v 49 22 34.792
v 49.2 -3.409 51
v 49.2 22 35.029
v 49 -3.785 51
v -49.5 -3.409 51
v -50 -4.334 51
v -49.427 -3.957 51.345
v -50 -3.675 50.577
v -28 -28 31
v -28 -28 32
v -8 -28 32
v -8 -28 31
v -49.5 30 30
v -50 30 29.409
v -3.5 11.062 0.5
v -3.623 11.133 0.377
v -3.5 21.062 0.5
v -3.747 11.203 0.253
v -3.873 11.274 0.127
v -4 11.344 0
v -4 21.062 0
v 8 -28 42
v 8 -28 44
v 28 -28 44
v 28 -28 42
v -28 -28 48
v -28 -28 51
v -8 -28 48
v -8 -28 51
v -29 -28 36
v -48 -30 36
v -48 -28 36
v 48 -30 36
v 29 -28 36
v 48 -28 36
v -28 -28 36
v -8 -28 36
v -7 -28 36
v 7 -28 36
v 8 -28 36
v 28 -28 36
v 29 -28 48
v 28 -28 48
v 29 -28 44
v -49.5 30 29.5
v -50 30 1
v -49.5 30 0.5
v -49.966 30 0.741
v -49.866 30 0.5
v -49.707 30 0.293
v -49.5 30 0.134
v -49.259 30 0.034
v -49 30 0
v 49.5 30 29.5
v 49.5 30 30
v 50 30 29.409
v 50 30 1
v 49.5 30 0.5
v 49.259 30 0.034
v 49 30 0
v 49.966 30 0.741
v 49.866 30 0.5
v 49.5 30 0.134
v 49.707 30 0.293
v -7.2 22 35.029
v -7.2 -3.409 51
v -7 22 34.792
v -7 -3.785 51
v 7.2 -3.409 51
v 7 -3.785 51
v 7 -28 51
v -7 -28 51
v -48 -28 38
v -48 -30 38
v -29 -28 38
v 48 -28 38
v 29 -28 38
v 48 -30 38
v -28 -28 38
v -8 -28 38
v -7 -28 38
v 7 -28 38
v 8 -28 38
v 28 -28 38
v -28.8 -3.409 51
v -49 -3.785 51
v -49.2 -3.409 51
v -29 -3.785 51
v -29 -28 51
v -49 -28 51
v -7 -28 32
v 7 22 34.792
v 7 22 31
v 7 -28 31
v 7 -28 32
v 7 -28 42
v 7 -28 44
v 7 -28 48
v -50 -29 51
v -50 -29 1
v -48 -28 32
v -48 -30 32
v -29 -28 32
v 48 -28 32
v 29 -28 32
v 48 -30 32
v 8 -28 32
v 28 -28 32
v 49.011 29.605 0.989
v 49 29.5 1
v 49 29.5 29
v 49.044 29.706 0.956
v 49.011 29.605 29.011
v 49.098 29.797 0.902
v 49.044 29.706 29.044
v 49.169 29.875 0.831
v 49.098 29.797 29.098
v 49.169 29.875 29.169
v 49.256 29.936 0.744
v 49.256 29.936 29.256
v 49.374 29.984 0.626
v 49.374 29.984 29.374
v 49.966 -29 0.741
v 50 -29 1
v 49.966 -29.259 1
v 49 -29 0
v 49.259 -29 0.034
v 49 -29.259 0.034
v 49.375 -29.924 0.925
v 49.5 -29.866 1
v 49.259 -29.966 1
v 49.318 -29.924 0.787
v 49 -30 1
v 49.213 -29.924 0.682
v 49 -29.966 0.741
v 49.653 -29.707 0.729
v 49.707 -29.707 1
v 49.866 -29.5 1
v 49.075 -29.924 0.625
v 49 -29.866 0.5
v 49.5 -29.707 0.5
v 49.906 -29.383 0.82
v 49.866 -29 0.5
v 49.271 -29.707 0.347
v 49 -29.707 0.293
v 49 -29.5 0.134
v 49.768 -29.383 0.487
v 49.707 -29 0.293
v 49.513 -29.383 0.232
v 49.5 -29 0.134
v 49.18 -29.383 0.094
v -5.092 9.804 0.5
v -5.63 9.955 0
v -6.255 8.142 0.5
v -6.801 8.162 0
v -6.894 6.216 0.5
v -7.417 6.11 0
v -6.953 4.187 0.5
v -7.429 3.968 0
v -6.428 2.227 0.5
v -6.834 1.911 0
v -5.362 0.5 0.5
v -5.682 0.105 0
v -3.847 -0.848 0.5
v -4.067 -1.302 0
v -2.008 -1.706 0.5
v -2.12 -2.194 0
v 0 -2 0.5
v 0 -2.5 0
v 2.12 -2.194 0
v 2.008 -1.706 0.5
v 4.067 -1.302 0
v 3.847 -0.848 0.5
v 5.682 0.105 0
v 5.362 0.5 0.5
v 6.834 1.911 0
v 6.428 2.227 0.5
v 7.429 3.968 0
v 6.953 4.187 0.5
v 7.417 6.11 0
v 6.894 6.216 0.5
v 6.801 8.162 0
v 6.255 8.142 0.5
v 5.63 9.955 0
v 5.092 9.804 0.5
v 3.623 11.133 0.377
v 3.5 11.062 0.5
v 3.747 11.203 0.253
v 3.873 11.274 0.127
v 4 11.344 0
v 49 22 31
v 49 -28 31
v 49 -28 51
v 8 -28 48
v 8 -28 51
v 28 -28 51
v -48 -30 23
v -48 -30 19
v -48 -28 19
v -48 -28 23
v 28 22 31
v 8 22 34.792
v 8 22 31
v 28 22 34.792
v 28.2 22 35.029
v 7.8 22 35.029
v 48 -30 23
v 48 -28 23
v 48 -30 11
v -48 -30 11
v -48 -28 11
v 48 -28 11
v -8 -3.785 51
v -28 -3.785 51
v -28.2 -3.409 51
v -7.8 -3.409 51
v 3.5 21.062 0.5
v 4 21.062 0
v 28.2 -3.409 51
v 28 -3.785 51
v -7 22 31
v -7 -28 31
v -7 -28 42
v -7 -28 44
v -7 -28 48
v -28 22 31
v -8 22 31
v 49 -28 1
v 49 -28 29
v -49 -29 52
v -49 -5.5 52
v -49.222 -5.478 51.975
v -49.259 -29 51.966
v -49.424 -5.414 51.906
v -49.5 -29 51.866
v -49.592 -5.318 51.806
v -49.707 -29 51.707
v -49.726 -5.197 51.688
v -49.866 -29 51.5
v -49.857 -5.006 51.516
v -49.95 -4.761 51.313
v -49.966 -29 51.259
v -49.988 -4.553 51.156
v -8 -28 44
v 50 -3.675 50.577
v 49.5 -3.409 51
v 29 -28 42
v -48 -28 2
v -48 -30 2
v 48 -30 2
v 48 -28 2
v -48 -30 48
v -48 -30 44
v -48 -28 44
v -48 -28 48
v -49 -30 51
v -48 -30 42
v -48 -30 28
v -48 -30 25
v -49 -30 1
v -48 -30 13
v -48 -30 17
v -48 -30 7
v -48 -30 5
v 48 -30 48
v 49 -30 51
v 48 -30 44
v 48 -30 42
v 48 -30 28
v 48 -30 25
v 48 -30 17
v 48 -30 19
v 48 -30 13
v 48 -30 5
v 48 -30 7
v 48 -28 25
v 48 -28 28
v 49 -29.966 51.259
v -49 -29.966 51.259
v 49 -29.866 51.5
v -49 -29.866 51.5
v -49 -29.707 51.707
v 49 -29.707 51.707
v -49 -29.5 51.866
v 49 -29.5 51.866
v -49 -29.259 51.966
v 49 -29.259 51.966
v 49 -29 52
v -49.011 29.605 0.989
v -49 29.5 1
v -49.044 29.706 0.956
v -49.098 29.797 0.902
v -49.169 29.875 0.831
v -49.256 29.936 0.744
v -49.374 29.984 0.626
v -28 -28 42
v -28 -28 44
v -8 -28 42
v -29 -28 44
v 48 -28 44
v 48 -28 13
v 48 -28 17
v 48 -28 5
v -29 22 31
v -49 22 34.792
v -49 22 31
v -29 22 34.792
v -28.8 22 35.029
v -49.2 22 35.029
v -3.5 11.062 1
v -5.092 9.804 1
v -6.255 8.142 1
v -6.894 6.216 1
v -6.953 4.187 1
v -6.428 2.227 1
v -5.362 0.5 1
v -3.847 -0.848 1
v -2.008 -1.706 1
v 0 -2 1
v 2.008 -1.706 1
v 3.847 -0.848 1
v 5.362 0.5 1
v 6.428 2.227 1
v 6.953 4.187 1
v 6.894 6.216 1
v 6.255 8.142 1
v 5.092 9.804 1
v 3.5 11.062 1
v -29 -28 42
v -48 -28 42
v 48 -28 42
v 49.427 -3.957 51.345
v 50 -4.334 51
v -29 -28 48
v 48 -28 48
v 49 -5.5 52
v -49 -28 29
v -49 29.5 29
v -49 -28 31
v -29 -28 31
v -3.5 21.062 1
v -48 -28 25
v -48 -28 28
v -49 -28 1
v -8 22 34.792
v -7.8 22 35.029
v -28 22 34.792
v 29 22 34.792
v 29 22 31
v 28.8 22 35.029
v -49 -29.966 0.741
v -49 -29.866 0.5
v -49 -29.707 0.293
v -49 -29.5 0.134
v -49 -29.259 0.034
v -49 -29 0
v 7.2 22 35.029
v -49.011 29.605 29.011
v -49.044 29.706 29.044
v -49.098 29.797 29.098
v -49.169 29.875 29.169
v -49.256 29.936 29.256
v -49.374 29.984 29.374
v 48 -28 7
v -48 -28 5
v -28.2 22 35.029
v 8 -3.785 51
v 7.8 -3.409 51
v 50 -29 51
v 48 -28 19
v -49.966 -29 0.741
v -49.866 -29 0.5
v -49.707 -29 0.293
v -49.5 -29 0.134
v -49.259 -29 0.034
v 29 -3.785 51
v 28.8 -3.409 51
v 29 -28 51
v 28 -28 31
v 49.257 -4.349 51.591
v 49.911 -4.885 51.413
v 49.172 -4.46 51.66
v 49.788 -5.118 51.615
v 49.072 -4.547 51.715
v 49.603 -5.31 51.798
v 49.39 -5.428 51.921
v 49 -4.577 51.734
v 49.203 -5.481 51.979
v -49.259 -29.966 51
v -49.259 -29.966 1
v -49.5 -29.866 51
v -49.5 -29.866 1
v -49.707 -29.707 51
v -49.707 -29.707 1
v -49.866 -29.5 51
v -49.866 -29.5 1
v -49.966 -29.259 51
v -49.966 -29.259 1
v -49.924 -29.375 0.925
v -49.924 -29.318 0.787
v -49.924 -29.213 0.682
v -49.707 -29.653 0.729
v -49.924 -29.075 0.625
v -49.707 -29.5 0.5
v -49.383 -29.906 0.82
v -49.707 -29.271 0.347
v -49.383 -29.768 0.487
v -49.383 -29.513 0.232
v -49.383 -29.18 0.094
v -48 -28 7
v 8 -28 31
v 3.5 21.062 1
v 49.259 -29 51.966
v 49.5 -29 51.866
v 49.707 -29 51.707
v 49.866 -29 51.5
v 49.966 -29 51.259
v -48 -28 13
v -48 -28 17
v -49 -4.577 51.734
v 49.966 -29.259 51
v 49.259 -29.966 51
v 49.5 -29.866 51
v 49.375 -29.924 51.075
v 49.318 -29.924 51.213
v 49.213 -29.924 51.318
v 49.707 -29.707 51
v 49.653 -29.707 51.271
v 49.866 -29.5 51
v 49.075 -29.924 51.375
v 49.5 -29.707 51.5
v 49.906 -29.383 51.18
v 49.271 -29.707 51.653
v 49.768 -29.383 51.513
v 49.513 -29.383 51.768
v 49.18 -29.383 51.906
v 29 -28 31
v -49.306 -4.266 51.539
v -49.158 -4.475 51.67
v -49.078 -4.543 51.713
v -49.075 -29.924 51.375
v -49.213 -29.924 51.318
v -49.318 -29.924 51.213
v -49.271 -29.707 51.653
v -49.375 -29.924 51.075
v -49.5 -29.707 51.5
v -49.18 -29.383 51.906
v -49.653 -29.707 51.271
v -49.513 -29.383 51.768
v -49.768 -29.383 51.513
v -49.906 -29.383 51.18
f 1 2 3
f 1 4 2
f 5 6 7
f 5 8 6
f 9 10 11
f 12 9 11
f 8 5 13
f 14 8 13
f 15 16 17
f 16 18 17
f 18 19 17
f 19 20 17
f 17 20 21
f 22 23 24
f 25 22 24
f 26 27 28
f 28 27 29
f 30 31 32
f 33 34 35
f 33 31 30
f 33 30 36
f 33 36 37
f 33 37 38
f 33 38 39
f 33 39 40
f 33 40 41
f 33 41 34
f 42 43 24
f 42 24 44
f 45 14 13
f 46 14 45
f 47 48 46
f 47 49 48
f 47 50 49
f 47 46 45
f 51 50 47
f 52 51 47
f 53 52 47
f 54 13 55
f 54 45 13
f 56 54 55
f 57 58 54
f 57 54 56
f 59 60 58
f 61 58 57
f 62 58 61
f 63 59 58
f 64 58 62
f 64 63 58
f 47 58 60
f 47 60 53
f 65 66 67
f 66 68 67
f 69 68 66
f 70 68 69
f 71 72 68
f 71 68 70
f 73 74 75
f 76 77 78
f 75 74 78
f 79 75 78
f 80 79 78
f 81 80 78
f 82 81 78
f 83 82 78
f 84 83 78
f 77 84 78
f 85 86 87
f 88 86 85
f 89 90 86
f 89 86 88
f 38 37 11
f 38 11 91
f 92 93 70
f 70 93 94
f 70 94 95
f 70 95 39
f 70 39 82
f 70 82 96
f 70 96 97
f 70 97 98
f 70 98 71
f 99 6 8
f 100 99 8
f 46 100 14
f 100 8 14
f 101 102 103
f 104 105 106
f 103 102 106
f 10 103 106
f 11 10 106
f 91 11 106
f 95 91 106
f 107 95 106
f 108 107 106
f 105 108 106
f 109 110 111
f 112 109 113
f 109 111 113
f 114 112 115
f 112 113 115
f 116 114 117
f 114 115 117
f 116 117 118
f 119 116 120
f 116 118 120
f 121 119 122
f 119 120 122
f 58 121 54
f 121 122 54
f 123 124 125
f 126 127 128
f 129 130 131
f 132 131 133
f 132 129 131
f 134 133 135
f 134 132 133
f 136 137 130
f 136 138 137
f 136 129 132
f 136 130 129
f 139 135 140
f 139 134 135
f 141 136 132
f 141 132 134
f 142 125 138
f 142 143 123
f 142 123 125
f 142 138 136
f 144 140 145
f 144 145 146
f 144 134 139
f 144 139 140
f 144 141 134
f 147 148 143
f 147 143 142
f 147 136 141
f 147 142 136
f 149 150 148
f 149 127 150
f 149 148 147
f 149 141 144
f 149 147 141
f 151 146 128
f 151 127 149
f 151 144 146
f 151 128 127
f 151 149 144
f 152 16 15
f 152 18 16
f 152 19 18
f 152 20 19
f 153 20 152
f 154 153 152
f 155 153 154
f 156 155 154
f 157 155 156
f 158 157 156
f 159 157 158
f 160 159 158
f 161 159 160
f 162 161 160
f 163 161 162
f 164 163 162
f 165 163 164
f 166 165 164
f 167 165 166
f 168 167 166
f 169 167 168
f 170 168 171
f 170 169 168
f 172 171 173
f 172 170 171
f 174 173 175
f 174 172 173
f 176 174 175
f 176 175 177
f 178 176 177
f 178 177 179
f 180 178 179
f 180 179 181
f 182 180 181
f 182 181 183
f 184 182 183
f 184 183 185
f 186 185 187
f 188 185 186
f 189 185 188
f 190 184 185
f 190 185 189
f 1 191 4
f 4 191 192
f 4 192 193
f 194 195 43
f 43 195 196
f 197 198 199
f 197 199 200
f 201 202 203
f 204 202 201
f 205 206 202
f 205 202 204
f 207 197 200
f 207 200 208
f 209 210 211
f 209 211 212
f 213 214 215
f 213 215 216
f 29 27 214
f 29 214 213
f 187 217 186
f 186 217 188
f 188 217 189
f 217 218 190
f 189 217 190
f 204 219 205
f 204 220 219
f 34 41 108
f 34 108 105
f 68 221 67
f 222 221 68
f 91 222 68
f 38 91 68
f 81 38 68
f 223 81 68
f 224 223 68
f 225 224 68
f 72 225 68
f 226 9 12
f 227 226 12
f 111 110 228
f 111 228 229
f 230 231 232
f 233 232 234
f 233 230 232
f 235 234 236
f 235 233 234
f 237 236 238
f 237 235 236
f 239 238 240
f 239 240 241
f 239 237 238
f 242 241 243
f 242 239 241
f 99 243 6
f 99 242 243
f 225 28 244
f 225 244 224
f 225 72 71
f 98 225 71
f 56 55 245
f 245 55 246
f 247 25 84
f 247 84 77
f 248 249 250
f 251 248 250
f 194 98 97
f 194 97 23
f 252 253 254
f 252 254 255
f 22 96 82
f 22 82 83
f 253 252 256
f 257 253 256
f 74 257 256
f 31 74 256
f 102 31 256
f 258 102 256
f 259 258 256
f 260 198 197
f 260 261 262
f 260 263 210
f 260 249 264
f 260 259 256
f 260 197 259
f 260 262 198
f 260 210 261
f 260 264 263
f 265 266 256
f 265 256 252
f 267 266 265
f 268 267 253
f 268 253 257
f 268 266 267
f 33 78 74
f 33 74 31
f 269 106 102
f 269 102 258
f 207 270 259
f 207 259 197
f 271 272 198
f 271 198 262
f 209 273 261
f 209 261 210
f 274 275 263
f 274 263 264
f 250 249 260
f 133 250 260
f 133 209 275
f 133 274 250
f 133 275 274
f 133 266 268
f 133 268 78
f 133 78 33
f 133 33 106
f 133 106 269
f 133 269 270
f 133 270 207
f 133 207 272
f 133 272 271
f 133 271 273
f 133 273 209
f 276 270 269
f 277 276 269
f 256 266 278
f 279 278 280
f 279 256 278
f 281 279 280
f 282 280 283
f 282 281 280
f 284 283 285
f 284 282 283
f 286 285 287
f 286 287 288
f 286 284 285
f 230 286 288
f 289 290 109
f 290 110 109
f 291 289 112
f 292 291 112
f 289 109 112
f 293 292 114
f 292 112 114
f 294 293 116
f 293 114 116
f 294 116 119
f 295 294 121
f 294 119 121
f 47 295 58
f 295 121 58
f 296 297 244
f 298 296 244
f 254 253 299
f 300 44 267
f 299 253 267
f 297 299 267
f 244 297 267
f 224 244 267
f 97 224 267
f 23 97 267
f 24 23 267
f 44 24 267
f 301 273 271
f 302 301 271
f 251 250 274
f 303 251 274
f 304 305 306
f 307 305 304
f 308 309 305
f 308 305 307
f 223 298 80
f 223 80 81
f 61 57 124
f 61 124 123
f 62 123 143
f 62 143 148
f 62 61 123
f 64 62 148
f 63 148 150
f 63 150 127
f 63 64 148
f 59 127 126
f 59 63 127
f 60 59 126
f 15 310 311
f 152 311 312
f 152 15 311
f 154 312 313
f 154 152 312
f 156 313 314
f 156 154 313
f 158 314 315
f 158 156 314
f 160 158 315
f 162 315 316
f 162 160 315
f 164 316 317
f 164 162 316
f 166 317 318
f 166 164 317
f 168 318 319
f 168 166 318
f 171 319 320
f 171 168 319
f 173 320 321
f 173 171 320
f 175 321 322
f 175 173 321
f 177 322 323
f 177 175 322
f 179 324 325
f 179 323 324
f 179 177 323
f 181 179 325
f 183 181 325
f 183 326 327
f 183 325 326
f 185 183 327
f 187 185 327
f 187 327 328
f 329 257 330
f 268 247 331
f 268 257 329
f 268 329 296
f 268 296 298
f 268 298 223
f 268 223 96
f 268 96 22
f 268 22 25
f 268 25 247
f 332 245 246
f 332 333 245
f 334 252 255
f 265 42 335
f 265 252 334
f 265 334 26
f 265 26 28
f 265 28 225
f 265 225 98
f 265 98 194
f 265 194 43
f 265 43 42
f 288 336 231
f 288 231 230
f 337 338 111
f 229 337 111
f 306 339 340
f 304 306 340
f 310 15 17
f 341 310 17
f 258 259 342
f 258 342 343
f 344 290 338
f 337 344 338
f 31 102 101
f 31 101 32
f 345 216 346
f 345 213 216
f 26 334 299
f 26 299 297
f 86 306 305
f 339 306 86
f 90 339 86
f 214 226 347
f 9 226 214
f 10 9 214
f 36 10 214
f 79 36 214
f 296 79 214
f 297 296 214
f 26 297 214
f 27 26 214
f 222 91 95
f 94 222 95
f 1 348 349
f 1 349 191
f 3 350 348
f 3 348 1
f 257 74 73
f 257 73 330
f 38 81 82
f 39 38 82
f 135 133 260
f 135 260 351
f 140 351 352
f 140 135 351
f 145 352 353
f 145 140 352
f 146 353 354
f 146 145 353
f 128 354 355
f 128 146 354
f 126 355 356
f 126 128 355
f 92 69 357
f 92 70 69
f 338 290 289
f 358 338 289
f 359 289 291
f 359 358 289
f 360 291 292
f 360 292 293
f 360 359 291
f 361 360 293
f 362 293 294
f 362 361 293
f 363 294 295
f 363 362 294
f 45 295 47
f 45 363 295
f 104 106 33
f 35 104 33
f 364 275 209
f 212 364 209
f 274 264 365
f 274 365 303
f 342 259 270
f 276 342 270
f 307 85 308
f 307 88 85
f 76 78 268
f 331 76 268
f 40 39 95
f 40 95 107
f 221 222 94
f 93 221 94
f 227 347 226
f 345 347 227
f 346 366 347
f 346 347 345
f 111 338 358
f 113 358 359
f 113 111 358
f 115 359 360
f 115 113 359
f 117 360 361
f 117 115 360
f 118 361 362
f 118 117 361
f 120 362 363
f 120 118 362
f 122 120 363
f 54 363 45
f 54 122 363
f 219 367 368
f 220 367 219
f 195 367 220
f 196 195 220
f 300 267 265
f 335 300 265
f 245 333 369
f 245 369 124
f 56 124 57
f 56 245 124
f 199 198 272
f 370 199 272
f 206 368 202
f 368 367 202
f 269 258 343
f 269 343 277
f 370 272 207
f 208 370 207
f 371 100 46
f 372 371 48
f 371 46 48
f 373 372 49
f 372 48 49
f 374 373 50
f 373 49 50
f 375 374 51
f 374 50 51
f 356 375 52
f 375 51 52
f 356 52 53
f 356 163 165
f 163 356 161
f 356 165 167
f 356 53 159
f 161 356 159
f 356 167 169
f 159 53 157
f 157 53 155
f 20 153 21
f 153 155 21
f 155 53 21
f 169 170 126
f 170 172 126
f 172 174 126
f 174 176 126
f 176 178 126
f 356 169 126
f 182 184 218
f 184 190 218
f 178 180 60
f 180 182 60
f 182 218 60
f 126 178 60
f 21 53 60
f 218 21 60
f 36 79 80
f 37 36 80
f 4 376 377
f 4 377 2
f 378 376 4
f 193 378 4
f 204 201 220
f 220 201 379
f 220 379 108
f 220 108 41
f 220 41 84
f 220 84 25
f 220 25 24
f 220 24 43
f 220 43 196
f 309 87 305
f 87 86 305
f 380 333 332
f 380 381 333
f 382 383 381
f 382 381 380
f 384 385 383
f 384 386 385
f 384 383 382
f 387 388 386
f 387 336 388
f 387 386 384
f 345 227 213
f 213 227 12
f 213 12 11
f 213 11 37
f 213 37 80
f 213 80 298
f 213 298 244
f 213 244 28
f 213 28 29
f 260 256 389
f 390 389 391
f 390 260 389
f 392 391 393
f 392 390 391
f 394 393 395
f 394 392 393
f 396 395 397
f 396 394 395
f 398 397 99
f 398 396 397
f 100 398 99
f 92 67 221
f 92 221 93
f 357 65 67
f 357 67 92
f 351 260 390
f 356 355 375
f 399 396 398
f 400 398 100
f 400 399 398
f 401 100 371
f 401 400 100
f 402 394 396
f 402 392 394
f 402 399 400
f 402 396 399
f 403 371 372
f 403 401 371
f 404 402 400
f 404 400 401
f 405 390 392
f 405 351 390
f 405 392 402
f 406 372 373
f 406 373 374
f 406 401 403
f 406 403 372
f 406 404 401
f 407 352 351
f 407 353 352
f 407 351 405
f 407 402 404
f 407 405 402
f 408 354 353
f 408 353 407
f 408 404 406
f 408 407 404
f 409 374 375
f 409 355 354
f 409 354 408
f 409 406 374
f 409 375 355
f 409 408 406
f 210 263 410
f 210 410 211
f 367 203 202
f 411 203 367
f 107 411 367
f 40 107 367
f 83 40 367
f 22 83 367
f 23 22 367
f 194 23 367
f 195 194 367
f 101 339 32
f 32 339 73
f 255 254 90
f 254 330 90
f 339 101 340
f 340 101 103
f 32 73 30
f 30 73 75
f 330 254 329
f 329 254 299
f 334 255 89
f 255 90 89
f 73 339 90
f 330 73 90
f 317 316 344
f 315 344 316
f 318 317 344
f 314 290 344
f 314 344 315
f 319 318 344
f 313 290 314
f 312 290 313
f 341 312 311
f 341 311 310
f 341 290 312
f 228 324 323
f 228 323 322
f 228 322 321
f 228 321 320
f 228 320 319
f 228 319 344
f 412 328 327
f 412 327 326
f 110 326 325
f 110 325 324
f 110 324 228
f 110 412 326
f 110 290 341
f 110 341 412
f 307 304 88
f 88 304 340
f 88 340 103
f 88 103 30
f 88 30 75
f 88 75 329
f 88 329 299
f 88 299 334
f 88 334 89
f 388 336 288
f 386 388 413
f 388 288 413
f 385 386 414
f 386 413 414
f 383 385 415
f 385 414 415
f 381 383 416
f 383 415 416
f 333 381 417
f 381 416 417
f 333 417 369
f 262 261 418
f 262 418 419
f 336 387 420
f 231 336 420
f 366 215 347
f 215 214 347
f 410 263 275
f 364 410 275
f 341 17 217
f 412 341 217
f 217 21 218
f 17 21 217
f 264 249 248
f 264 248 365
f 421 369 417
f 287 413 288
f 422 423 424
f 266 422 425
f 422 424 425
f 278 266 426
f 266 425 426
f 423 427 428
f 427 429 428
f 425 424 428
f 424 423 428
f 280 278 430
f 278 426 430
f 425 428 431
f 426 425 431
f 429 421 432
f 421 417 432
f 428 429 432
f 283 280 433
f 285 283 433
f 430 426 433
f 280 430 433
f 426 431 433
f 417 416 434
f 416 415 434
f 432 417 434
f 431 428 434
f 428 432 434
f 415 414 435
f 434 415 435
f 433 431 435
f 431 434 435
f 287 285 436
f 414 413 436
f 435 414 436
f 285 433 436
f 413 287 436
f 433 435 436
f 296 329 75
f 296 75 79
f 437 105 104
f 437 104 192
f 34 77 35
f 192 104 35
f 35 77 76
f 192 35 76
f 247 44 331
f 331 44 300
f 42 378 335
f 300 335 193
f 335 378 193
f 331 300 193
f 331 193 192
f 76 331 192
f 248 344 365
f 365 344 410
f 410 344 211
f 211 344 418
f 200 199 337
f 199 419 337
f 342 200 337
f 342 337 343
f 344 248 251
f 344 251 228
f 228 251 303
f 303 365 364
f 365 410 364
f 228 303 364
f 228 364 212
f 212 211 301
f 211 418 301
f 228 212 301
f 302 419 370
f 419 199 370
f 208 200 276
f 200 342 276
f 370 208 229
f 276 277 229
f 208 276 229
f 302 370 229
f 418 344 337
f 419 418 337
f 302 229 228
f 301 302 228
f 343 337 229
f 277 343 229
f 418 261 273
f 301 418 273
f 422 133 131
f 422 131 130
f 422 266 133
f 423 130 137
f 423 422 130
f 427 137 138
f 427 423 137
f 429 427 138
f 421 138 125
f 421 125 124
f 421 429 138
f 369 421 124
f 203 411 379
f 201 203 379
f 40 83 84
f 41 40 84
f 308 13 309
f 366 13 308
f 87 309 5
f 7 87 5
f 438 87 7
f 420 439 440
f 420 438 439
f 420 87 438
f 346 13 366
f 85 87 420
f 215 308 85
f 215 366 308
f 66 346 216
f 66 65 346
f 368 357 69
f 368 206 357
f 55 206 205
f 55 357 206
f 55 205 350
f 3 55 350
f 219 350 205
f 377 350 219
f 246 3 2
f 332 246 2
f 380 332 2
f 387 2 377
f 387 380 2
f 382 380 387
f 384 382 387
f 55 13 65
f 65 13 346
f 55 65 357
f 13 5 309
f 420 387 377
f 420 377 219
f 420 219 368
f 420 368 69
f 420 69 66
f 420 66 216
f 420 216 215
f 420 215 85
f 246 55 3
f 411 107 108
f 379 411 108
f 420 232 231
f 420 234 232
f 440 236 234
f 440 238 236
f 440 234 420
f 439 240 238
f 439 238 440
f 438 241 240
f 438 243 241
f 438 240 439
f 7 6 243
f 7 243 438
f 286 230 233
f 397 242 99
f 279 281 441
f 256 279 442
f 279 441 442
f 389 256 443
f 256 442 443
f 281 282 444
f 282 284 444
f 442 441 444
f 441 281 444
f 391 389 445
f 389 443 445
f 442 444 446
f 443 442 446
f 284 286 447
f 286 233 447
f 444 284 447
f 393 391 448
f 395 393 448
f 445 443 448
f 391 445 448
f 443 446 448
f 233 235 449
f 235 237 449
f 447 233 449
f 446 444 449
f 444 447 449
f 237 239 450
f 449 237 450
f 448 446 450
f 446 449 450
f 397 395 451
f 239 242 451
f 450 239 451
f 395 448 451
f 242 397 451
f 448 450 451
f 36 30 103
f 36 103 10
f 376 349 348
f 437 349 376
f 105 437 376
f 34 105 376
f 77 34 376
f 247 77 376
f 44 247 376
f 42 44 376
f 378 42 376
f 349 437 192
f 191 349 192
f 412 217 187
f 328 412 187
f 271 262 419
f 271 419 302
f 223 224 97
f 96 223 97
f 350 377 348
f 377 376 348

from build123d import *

# Parameters (mm, degrees)
SKETCH_W        = 100
SKETCH_H        = 60
PAD_DEPTH       = 30
SKETCH001_W     = 98
SKETCH001_H     = 28
POCKET_DEPTH    = 58
SKETCH002_W     = 96
SKETCH002_H     = 3
POCKET001_DEPTH = 60.001
SKETCH003_W     = 96
SKETCH003_H     = 4
POCKET002_DEPTH = 60.001
SKETCH007_W     = 96
SKETCH007_H     = 4
POCKET003_DEPTH = 60.001
SKETCH008_W     = 96
SKETCH008_H     = 4
POCKET004_DEPTH = 60.001
SKETCH009_W     = 96
SKETCH009_H     = 3
POCKET005_DEPTH = 60.001
POCKET006_DEPTH = 2
PAD001_DEPTH    = 100
SKETCH012_W     = 20
SKETCH012_H     = 20
SKETCH012_W_2   = 14
POCKET007_DEPTH = 50
SKETCH013_W     = 96
SKETCH013_H     = 4
POCKET008_DEPTH = 2
SKETCH014_W     = 96
SKETCH014_H     = 4
POCKET009_DEPTH = 2
SKETCH015_W     = 96
SKETCH015_H     = 4
POCKET010_DEPTH = 2
FILLET_R        = 1
CHAMFER_SIZE    = 0.5
CHAMFER001_SIZE = 0.2
CHAMFER002_SIZE = 0.2
CHAMFER003_SIZE = 0.2
FILLET001_R     = 0.5
CHAMFER004_SIZE = 0.5


with BuildPart() as part:
    # Sketch → Pad (new body)
    with BuildSketch(Plane.XY):
        Rectangle(SKETCH_W, SKETCH_H)
    extrude(amount=PAD_DEPTH)

    # Sketch001 → Pocket (cut)
    with BuildSketch(Plane.XZ.offset(-30)):
        with Locations((0, 15)):
            Rectangle(SKETCH001_W, SKETCH001_H)
    extrude(amount=POCKET_DEPTH, mode=Mode.SUBTRACT)

    # Sketch002 → Pocket001 (cut, through all)
    with BuildSketch(Plane.XZ.offset(30)):
        with Locations((0, 26.5)):
            Rectangle(SKETCH002_W, SKETCH002_H)
    extrude(amount=-POCKET001_DEPTH, mode=Mode.SUBTRACT)

    # Sketch003 → Pocket002 (cut, through all)
    with BuildSketch(Plane.XZ.offset(30)):
        with Locations((0, 21)):
            Rectangle(SKETCH003_W, SKETCH003_H)
    extrude(amount=-POCKET002_DEPTH, mode=Mode.SUBTRACT)

    # Sketch007 → Pocket003 (cut, through all)
    with BuildSketch(Plane.XZ.offset(30)):
        with Locations((0, 15)):
            Rectangle(SKETCH007_W, SKETCH007_H)
    extrude(amount=-POCKET003_DEPTH, mode=Mode.SUBTRACT)

    # Sketch008 → Pocket004 (cut, through all)
    with BuildSketch(Plane.XZ.offset(30)):
        with Locations((0, 9)):
            Rectangle(SKETCH008_W, SKETCH008_H)
    extrude(amount=-POCKET004_DEPTH, mode=Mode.SUBTRACT)

    # Sketch009 → Pocket005 (cut, through all)
    with BuildSketch(Plane.XZ.offset(30)):
        with Locations((0, 3.5)):
            Rectangle(SKETCH009_W, SKETCH009_H)
    extrude(amount=-POCKET005_DEPTH, mode=Mode.SUBTRACT)

    # Sketch010 → Pocket006 (cut)
    with BuildSketch(Plane.XY):
        with BuildLine():
            Line((-3.5, 21.062178), (3.5, 21.062178))
            Line((3.5, 21.062178), (3.5, 11.062178))
            ThreePointArc((-3.5, 11.062178), (0, -2), (3.5, 11.062178))
            Line((-3.5, 11.062178), (-3.5, 21.062178))
        make_face()
    extrude(amount=POCKET006_DEPTH, mode=Mode.SUBTRACT)

    # Sketch011 → Pad001 (join)
    with BuildSketch(Plane.YZ.offset(50)):
        Polygon((-30, 52), (-30, 30), (30, 30), (-5, 52), align=None)
    extrude(amount=-PAD001_DEPTH)

    # Sketch012 → Pocket007 (cut)
    with BuildSketch(Plane.XZ.offset(28)):
        with Locations((39, 41)):
            Rectangle(SKETCH012_W, SKETCH012_H)
        with Locations((18, 41)):
            Rectangle(SKETCH012_W, SKETCH012_H)
        with Locations((-39, 41)):
            Rectangle(SKETCH012_W, SKETCH012_H)
        with Locations((-18, 41)):
            Rectangle(SKETCH012_W, SKETCH012_H)
        with Locations((0, 41)):
            Rectangle(SKETCH012_W_2, SKETCH012_H)
    extrude(amount=-POCKET007_DEPTH, mode=Mode.SUBTRACT)

    # Sketch013 → Pocket008 (cut)
    with BuildSketch(Plane.XZ.offset(30)):
        with Locations((0, 34)):
            Rectangle(SKETCH013_W, SKETCH013_H)
    extrude(amount=-POCKET008_DEPTH, mode=Mode.SUBTRACT)

    # Sketch014 → Pocket009 (cut)
    with BuildSketch(Plane.XZ.offset(30)):
        with Locations((0, 40)):
            Rectangle(SKETCH014_W, SKETCH014_H)
    extrude(amount=-POCKET009_DEPTH, mode=Mode.SUBTRACT)

    # Sketch015 → Pocket010 (cut)
    with BuildSketch(Plane.XZ.offset(30)):
        with Locations((0, 46)):
            Rectangle(SKETCH015_W, SKETCH015_H)
    extrude(amount=-POCKET010_DEPTH, mode=Mode.SUBTRACT)

    # Fillet
    fillet_edges = [part.edges().sort_by_distance(p)[0] for p in [
        (-50, -17.5, 52),
        (50, -17.5, 52),
        (50, 0, 0),
        (50, -30, 26),
        (0, -30, 52),
        (0, -30, 0),
        (-50, -30, 26),
        (-50, 0, 0),
    ]]
    fillet(fillet_edges, radius=FILLET_R)

    # Chamfer
    chamfer_edges = [part.edges().sort_by_distance(p)[0] for p in [
        (50, 13.295455, 40.5),
        (-50, 13.295455, 40.5),
    ]]
    chamfer(chamfer_edges, length=CHAMFER_SIZE)

    # Chamfer001
    chamfer001_edges = [part.edges().sort_by_distance(p)[0] for p in [
        (-29, 9.295455, 43.014286),
        (-28, 9.295455, 43.014286),
    ]]
    chamfer(chamfer001_edges, length=CHAMFER001_SIZE)

    # Chamfer002
    chamfer002_edges = [part.edges().sort_by_distance(p)[0] for p in [
        (7, 9.295455, 43.014286),
        (8, 9.295455, 43.014286),
        (-8, 9.295455, 43.014286),
        (-7, 9.295455, 43.014286),
        (28, 9.295455, 43.014286),
        (29, 9.295455, 43.014286),
    ]]
    chamfer(chamfer002_edges, length=CHAMFER002_SIZE)

    # Chamfer003
    chamfer003_edges = [part.edges().sort_by_distance(p)[0] for p in [
        (49, 9.295455, 43.014286),
        (-49, 9.295455, 43.014286),
    ]]
    chamfer(chamfer003_edges, length=CHAMFER003_SIZE)

    # Fillet001
    fillet001_edges = [part.edges().sort_by_distance(p)[0] for p in [
        (49, 30, 15),
        (0, 30, 29),
        (0, 30, 1),
        (-49, 30, 15),
    ]]
    fillet(fillet001_edges, radius=FILLET001_R)

    # Chamfer004
    chamfer004_edges = [part.edges().sort_by_distance(p)[0] for p in [
        (0, -2, 0),
        (3.5, 16.062178, 0),
        (-3.5, 16.062178, 0),
    ]]
    chamfer(chamfer004_edges, length=CHAMFER004_SIZE)


solid = part.part
